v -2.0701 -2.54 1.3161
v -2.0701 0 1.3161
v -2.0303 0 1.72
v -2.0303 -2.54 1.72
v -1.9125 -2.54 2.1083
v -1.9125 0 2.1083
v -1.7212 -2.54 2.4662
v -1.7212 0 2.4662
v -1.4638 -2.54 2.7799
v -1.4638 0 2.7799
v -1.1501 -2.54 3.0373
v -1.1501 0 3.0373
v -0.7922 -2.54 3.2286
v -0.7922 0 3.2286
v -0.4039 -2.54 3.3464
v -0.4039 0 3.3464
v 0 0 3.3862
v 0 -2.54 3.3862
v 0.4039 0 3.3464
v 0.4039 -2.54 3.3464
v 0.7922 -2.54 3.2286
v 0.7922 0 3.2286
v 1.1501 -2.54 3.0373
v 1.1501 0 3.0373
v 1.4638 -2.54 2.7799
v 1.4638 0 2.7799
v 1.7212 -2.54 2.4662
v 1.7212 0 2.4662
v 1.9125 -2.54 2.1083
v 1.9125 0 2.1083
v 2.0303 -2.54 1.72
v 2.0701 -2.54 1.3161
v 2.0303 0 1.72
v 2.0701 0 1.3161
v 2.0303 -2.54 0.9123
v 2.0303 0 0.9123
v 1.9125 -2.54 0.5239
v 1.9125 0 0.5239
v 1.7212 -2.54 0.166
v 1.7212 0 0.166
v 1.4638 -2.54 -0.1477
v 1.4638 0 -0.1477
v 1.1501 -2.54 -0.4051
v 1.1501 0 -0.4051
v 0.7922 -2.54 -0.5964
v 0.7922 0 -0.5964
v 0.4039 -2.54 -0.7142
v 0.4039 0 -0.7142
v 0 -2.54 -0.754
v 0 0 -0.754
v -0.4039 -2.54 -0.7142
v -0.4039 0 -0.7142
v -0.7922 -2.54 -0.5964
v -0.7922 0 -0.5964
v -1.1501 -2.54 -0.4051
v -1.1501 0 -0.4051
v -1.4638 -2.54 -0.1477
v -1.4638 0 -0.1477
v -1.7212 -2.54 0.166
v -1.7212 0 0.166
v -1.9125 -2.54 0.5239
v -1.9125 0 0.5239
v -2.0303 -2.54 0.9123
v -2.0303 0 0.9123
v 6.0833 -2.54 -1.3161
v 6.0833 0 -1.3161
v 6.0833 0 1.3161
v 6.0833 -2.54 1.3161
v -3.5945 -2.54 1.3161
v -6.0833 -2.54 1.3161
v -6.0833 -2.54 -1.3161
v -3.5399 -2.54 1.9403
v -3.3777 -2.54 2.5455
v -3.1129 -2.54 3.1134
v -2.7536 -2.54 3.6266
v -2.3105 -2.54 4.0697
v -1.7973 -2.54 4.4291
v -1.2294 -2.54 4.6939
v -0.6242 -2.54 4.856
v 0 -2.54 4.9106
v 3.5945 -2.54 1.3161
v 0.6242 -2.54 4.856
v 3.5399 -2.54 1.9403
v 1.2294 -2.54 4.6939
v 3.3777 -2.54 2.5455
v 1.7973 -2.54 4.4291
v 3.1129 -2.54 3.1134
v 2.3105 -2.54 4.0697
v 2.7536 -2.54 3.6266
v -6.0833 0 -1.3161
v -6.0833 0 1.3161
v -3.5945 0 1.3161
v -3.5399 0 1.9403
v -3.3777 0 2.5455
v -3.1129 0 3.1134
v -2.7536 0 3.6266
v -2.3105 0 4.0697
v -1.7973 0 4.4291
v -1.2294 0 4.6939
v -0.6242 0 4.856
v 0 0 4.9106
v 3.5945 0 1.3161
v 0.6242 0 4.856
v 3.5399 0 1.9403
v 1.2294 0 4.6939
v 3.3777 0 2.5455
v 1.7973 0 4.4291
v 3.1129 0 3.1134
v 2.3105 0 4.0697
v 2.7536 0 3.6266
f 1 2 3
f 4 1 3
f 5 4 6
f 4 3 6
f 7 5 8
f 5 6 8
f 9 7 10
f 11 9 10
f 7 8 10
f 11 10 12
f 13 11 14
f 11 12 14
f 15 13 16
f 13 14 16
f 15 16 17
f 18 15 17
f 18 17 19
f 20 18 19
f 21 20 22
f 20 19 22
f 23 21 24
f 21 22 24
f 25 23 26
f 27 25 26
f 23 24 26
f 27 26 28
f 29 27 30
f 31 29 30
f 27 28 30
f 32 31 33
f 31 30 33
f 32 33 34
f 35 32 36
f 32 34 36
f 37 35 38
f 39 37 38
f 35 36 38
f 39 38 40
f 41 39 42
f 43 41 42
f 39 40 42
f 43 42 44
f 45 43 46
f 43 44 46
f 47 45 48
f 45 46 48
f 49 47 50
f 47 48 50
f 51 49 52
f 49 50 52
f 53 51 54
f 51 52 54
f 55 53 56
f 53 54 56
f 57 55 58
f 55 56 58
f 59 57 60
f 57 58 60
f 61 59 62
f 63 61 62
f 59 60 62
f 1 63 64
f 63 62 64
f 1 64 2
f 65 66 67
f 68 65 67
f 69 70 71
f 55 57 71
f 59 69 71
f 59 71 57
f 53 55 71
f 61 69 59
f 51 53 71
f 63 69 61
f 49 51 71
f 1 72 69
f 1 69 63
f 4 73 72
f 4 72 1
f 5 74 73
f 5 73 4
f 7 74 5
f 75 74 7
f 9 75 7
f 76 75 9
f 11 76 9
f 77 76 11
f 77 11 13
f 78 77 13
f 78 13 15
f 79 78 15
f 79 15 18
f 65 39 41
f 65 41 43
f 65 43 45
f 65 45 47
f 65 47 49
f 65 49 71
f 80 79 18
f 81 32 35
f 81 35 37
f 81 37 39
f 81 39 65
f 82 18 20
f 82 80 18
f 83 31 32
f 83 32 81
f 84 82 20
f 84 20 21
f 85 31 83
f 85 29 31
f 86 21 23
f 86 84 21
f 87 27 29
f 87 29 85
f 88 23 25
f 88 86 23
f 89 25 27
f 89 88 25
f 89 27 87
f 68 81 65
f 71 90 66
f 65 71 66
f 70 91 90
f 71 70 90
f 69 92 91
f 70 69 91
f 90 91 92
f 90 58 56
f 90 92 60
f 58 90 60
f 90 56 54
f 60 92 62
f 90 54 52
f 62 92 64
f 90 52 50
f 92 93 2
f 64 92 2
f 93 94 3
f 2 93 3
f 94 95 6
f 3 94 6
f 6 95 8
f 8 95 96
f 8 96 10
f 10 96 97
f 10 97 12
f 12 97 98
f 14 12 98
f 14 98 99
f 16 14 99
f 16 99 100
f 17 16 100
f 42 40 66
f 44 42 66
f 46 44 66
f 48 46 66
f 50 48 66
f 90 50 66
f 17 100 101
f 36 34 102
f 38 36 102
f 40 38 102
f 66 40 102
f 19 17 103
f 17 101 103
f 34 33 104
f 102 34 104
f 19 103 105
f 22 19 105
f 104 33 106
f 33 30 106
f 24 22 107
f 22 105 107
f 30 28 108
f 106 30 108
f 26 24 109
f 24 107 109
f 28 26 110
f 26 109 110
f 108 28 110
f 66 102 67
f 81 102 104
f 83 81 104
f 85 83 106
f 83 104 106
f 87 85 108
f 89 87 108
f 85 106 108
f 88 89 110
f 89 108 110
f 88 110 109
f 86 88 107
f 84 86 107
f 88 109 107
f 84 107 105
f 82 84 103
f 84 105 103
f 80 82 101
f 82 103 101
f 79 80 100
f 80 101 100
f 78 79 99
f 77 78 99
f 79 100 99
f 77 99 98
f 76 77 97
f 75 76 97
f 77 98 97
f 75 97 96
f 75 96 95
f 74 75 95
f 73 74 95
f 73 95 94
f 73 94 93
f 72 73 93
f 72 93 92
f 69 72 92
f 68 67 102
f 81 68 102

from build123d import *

# Parameters (mm, degrees)
F1_DEPTH = 2.54


with BuildPart() as f1:
    # F0 (on Front) → F1 (new body)
    with BuildSketch(Plane.XZ):
        with BuildLine():
            Line((6.083285, -1.316122), (6.083285, 1.316122))
            Line((6.083285, 1.316122), (3.594506, 1.316122))
            ThreePointArc((3.594506, 1.316122), (3.295386, -0.119464), (2.447808, -1.316122))
            Line((2.447808, -1.316122), (6.083285, -1.316122))
        make_face()
        with BuildLine():
            ThreePointArc((2.447808, -1.316122), (3.295386, -0.119464), (3.594506, 1.316122))
            Line((3.594506, 1.316122), (2.0701, 1.316122))
            ThreePointArc((2.0701, 1.316122), (0, -0.753978), (-2.0701, 1.316122))
            Line((-2.0701, 1.316122), (-3.594506, 1.316122))
            ThreePointArc((-3.594506, 1.316122), (-3.295386, -0.119464), (-2.447808, -1.316122))
            Line((-2.447808, -1.316122), (2.447808, -1.316122))
        make_face()
        with BuildLine():
            Line((2.0701, 1.316122), (3.594506, 1.316122))
            ThreePointArc((3.594506, 1.316122), (0, 4.910627), (-3.594506, 1.316122))
            Line((-3.594506, 1.316122), (-2.0701, 1.316122))
            ThreePointArc((-2.0701, 1.316122), (0, 3.386222), (2.0701, 1.316122))
        make_face()
        with BuildLine():
            ThreePointArc((-2.447808, -1.316122), (-3.295386, -0.119464), (-3.594506, 1.316122))
            Line((-3.594506, 1.316122), (-6.083285, 1.316122))
            Line((-6.083285, 1.316122), (-6.083285, -1.316122))
            Line((-6.083285, -1.316122), (-2.447808, -1.316122))
        make_face()
    extrude(amount=F1_DEPTH)


solid = f1.part
